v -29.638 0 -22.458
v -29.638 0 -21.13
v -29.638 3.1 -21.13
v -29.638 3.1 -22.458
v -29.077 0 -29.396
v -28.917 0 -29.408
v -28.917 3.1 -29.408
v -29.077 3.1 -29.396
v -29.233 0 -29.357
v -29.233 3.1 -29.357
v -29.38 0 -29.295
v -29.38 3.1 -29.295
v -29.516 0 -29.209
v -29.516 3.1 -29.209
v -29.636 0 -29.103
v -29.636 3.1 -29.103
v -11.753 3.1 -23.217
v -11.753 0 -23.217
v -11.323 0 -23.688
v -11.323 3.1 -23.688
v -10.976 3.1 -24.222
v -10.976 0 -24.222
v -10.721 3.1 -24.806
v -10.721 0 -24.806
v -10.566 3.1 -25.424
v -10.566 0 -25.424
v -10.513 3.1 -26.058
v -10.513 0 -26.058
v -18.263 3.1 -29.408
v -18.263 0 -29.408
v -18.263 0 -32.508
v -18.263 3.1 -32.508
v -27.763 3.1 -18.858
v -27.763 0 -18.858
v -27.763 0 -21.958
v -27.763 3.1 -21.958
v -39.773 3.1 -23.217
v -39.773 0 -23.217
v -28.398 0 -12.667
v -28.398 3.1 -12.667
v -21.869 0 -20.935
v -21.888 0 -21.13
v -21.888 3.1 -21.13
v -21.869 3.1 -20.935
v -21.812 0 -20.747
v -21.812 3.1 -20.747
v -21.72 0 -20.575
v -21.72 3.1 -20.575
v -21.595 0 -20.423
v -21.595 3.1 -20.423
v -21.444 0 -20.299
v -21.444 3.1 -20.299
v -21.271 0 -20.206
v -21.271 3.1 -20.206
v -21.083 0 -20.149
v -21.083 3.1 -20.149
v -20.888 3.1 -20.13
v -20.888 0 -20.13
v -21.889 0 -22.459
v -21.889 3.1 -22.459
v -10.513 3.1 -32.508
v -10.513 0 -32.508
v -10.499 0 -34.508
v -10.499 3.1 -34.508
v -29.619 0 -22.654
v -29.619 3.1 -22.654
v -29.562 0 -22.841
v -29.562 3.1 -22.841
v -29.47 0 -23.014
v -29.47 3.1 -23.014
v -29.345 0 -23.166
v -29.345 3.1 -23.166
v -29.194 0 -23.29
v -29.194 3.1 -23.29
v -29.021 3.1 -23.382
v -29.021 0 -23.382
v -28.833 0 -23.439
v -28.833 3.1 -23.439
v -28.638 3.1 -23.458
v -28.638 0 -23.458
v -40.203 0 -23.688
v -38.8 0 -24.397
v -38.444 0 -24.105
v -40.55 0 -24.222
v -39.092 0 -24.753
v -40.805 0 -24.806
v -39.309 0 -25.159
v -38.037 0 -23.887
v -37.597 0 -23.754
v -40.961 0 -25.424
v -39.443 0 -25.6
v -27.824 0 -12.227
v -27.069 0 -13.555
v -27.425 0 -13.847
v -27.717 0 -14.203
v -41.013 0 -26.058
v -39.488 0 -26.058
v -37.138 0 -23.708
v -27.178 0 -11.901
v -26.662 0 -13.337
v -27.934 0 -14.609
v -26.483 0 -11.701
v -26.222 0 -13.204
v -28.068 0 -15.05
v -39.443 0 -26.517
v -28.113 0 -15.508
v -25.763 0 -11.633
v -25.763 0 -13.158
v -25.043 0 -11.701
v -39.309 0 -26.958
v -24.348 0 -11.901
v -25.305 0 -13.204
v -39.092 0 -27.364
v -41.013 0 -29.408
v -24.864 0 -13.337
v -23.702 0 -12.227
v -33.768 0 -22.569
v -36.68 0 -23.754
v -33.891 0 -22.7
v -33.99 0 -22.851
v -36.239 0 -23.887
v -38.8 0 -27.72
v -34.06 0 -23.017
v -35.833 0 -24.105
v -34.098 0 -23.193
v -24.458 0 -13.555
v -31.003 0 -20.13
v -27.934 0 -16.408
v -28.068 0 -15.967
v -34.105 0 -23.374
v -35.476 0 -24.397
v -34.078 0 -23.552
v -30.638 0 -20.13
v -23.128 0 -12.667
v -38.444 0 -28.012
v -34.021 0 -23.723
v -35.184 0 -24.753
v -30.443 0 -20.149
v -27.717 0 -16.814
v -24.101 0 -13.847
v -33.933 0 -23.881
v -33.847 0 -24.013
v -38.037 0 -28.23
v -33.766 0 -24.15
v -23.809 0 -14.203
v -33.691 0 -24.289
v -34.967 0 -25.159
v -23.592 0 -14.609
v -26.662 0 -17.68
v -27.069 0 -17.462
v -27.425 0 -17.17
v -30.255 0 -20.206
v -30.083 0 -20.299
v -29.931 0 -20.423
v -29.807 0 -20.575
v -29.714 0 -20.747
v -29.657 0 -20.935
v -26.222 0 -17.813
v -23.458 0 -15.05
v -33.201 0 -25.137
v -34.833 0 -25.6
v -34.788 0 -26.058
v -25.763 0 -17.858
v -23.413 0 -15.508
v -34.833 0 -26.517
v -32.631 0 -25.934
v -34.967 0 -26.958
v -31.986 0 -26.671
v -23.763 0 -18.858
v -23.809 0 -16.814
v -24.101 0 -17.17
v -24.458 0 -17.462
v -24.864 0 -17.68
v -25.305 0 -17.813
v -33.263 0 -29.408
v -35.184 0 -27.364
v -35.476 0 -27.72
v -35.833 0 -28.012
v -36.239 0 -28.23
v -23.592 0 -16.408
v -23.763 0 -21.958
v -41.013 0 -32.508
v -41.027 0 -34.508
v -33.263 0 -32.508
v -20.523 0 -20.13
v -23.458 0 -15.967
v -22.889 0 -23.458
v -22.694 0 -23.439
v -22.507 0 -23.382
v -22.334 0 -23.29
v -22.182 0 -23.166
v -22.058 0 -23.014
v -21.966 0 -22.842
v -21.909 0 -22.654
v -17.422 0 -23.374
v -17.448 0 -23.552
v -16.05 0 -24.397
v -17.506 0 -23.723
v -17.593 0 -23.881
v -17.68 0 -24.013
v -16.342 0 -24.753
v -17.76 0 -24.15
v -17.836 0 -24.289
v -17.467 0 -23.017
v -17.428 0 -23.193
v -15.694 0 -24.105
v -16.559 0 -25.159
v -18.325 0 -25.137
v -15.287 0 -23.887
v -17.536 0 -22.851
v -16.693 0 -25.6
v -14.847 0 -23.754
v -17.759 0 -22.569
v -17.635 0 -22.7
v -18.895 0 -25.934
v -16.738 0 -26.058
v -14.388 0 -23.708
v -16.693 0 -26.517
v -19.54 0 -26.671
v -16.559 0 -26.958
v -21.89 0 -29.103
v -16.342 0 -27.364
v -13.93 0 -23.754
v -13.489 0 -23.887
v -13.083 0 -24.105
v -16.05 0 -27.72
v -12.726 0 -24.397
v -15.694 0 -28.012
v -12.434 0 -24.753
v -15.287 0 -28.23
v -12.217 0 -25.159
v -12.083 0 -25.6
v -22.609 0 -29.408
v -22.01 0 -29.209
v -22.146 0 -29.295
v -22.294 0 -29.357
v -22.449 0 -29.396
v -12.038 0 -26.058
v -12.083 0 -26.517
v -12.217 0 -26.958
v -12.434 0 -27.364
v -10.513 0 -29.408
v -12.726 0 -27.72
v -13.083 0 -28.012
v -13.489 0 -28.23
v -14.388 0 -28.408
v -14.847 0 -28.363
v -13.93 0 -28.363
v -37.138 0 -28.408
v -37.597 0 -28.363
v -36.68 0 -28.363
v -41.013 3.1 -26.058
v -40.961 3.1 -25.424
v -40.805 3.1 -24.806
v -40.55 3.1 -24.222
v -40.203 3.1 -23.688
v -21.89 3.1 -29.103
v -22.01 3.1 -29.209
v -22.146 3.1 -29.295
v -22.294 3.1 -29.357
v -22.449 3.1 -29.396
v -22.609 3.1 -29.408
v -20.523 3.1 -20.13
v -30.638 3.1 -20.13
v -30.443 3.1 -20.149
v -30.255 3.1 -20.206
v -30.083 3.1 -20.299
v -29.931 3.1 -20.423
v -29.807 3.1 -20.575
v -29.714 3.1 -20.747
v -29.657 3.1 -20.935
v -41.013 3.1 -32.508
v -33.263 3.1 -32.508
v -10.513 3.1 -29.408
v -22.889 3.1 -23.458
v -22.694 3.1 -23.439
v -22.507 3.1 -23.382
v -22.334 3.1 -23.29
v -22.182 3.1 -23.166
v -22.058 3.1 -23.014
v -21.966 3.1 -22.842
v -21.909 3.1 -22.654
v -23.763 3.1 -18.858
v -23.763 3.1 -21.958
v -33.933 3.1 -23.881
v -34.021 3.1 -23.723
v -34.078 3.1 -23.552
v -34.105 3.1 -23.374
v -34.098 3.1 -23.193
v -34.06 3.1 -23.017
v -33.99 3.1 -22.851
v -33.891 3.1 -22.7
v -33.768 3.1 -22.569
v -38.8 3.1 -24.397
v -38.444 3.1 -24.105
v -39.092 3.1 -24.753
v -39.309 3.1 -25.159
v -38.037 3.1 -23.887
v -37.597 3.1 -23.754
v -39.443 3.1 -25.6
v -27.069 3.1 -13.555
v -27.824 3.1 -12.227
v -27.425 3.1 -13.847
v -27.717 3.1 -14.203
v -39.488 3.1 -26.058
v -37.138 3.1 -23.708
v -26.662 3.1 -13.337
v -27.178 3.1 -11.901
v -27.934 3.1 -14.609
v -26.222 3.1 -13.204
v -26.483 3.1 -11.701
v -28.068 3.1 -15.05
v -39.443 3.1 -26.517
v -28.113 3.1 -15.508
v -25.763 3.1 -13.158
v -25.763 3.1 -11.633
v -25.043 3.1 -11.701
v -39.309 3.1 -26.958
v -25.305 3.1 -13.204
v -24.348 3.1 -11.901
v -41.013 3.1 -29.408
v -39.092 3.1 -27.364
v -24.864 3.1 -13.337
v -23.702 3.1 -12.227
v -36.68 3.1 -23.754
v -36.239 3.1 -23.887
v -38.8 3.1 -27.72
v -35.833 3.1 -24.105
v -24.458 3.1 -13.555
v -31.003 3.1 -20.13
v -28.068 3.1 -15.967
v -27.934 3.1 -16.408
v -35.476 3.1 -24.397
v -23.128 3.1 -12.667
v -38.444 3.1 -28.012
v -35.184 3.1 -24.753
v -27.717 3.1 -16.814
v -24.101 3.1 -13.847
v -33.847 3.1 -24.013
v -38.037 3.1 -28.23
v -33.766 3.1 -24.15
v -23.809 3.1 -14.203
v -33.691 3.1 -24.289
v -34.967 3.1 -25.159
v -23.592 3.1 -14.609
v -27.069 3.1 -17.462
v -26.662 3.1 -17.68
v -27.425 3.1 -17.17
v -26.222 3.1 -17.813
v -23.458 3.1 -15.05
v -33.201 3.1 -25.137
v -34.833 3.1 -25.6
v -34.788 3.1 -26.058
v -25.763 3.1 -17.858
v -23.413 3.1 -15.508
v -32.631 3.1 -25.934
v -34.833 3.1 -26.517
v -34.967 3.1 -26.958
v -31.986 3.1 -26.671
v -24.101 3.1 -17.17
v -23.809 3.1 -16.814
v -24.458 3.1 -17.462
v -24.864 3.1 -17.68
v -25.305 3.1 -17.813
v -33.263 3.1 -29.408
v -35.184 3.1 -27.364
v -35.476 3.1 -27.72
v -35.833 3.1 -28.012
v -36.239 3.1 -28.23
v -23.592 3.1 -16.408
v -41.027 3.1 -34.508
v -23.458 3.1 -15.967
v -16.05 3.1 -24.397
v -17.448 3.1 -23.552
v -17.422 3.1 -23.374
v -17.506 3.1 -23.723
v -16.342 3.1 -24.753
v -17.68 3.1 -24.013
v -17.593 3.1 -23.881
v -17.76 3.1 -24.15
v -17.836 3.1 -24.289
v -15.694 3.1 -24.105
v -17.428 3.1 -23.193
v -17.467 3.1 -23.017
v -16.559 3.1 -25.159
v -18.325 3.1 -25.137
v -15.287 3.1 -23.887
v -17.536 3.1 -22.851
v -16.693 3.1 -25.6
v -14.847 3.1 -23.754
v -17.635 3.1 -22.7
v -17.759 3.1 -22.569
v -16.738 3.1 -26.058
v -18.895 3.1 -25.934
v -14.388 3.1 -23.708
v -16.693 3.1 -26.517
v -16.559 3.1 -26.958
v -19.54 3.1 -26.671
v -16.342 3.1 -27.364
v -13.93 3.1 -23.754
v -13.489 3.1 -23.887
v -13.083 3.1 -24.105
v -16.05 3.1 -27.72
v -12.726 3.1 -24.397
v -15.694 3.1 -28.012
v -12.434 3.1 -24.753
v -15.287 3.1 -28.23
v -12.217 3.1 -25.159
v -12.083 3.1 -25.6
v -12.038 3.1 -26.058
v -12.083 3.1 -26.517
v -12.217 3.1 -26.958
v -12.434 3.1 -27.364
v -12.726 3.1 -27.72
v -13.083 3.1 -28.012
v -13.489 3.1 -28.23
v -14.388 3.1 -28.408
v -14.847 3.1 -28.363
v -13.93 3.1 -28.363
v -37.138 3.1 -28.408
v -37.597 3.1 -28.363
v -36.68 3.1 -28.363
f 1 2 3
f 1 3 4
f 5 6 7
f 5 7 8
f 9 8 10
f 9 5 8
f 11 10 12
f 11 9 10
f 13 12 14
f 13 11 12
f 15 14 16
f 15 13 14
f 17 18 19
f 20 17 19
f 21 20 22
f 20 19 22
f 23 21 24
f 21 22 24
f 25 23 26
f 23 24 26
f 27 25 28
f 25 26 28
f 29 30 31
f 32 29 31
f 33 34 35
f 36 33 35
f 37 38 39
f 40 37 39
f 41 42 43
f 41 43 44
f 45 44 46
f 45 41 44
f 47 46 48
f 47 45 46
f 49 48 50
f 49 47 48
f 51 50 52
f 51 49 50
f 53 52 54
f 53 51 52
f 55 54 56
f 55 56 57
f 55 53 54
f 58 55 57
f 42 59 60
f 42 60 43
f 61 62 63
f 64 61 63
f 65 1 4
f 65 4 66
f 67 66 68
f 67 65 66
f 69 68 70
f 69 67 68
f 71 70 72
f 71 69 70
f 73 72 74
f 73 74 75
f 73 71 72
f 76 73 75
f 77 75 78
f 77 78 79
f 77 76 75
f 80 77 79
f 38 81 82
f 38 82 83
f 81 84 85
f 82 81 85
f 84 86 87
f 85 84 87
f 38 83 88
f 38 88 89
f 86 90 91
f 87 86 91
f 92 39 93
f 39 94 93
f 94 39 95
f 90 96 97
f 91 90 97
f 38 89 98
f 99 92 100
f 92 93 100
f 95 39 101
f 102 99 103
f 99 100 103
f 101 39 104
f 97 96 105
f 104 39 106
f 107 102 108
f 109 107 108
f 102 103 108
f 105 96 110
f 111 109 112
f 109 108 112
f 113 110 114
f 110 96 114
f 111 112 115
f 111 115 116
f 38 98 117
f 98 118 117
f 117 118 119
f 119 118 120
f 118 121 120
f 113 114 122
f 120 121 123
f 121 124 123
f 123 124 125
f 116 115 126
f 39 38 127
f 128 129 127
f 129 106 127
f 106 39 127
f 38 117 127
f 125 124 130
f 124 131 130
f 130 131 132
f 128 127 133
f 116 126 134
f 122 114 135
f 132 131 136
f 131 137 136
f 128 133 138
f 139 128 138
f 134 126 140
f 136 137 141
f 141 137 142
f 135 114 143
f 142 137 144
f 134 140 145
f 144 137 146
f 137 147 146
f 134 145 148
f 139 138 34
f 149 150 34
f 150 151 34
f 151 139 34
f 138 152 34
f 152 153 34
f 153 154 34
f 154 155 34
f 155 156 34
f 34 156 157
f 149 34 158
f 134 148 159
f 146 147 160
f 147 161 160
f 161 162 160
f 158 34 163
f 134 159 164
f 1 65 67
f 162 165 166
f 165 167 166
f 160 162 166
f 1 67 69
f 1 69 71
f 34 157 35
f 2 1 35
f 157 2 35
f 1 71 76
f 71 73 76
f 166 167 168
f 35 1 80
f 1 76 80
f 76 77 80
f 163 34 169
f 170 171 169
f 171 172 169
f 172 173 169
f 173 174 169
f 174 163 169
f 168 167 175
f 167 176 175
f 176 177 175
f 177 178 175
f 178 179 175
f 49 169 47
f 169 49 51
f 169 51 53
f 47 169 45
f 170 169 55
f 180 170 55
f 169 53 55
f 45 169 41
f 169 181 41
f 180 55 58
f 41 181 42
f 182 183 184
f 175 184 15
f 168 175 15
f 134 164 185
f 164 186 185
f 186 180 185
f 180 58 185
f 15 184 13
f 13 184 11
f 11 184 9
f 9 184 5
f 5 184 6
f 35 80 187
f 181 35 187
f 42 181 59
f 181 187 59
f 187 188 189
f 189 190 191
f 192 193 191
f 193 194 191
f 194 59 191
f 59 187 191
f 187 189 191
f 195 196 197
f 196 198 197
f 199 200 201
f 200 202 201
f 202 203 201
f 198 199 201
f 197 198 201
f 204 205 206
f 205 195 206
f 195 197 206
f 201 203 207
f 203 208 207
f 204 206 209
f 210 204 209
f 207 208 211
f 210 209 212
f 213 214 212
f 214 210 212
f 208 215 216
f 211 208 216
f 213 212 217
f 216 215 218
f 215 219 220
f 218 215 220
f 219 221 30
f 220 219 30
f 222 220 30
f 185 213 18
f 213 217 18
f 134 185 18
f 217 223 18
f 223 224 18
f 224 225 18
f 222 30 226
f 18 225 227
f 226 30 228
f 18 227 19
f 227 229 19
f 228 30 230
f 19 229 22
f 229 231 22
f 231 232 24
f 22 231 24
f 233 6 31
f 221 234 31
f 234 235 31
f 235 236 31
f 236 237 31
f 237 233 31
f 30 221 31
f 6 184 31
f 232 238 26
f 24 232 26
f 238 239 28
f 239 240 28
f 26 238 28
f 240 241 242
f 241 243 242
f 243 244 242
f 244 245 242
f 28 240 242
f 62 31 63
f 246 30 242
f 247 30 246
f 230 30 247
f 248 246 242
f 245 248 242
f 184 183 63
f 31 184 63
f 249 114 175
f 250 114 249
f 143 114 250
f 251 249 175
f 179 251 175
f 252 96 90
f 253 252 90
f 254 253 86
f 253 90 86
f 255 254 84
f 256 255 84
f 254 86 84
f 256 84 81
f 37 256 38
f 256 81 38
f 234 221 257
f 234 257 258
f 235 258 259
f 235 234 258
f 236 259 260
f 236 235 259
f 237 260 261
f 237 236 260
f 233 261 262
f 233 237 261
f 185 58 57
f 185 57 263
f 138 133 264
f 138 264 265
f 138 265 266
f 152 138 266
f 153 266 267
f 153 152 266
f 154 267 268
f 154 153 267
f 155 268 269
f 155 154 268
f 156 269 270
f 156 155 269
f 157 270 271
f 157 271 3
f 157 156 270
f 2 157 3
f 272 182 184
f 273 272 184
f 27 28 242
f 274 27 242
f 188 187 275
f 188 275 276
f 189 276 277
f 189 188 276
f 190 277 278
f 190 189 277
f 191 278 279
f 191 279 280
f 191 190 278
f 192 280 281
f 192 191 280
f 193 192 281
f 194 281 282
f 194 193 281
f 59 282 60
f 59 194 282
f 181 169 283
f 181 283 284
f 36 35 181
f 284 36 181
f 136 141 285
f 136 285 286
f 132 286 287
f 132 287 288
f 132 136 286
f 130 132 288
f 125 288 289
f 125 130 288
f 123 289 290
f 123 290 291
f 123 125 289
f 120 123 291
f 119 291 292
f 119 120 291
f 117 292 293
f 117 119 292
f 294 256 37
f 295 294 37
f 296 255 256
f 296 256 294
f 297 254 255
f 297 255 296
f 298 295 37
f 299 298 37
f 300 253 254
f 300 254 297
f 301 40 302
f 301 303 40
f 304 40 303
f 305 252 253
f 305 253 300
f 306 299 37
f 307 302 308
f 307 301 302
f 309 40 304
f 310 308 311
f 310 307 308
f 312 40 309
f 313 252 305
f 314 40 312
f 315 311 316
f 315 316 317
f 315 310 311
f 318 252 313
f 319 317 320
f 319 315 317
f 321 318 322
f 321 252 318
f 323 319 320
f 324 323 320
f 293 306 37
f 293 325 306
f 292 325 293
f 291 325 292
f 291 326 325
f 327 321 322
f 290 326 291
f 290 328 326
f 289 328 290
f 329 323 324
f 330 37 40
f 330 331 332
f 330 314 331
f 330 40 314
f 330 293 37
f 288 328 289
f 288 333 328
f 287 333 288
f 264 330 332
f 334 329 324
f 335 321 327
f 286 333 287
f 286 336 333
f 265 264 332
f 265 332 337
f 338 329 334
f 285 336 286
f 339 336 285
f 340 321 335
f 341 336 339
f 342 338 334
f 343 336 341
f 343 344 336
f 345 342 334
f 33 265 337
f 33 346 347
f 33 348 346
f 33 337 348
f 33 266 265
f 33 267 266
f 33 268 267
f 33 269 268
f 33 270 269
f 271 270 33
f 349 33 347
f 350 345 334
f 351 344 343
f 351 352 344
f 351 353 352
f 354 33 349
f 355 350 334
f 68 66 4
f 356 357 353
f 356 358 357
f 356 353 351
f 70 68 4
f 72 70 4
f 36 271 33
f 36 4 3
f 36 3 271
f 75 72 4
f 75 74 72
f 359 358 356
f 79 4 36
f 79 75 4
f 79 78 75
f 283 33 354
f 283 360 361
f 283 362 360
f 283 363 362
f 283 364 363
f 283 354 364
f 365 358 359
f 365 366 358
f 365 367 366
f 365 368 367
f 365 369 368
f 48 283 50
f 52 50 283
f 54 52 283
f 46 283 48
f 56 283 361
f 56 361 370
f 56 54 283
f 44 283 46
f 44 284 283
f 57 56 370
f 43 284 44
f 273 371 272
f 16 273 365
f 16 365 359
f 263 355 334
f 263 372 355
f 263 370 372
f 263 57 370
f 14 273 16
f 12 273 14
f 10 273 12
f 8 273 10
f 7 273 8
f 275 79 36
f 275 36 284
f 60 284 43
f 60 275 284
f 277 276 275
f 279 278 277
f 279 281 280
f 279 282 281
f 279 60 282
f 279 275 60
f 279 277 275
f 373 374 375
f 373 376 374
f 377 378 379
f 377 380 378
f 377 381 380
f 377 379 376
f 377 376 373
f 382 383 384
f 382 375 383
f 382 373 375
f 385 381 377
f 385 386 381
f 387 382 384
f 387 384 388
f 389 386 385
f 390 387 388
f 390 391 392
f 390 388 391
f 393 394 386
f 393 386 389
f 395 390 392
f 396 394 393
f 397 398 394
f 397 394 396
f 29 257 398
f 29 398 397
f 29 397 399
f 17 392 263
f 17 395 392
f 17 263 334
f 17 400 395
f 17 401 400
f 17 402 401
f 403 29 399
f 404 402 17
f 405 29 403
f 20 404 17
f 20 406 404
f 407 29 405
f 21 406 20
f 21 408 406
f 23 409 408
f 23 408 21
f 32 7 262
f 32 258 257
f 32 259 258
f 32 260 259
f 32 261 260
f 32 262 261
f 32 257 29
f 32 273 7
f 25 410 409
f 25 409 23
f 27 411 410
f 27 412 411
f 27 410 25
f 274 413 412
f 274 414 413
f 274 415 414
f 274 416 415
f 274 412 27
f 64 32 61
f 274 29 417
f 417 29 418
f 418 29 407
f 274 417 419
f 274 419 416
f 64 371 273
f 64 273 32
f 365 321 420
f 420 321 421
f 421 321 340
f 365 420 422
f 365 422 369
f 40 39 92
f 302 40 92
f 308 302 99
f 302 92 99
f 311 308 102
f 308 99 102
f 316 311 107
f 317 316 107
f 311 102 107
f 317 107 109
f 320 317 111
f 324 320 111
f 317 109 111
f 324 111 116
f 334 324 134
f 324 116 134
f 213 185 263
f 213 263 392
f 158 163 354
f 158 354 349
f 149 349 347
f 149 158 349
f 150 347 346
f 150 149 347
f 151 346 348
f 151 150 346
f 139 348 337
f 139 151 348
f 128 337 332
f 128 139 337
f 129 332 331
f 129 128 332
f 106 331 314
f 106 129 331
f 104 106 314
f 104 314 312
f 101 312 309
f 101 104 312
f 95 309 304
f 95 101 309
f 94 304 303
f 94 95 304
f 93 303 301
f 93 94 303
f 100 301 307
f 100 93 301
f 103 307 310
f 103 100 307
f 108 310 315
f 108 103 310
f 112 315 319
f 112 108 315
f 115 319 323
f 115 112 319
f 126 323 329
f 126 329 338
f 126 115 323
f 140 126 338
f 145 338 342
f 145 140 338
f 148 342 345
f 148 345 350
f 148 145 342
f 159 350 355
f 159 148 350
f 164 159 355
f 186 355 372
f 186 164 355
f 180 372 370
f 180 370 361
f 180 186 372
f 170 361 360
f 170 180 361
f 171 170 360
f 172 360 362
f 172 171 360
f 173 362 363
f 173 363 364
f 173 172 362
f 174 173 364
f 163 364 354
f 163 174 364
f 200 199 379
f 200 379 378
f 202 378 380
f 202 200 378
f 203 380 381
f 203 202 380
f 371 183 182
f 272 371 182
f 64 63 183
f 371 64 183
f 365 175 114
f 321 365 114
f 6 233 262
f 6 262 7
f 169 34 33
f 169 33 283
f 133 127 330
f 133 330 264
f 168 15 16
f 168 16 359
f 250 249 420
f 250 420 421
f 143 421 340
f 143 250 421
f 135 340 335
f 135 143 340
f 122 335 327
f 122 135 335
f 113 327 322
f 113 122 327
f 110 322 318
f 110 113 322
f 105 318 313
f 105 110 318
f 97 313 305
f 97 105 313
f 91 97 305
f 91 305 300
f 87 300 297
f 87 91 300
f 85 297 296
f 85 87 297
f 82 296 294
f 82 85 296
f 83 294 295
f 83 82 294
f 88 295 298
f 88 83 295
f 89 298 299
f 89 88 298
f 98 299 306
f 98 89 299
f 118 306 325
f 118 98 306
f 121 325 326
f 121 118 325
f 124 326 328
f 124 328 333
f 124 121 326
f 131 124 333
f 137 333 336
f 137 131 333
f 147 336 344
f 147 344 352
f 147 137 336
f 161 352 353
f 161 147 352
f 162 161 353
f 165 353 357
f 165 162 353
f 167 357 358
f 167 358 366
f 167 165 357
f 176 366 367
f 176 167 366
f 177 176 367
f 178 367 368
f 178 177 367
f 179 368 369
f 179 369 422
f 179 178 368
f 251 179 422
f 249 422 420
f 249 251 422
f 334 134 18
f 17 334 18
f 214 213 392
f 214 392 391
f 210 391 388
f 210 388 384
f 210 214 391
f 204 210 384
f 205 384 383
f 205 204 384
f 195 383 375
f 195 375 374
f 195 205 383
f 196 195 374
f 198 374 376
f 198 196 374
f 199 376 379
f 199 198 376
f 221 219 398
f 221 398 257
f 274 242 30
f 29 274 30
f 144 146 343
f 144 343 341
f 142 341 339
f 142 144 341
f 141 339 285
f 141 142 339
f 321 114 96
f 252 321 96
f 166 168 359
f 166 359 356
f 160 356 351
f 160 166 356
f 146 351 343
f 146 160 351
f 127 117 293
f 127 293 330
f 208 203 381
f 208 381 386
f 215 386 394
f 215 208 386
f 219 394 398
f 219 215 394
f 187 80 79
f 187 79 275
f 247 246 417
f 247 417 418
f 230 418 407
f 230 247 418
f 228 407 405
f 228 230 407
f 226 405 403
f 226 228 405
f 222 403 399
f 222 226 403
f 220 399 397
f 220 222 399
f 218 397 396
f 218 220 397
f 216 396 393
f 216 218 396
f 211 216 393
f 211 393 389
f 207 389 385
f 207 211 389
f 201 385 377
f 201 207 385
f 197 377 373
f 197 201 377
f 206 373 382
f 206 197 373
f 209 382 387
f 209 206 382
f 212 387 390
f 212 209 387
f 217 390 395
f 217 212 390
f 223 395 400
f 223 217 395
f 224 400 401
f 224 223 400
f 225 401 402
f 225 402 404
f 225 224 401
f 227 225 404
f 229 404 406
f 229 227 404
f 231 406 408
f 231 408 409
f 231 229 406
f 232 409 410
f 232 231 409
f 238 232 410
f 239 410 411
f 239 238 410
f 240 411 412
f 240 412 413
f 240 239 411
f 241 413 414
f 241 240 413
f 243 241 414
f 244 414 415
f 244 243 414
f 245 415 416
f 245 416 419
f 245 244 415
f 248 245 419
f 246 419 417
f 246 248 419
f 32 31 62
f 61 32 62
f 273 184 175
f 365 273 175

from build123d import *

# Parameters (mm, degrees)
SKETCH1_R      = 2.35
SKETCH1_W      = 4
SKETCH1_H      = 3.1
EXTRUDE1_DEPTH = 3.1


with BuildPart() as part:
    # Sketch1 → Extrude1 (new body)
    with BuildSketch(Plane(origin=(0, 0, 0), x_dir=(1, 0, 0), z_dir=(0, 1, 0))):
        with BuildLine():
            Line((-41.013157114, 29.408489293), (-41.013157114, 26.058489293))
            ThreePointArc((-41.013157114, 26.058489293), (-40.689672648, 24.508533678), (-39.773228128, 23.217358224))
            Line((-39.773228128, 23.217358224), (-28.398228128, 12.667358224))
            ThreePointArc((-28.398228128, 12.667358224), (-25.763157114, 11.633489293), (-23.1280861, 12.667358224))
            Line((-23.1280861, 12.667358224), (-11.7530861, 23.217358224))
            ThreePointArc((-11.7530861, 23.217358224), (-10.83664158, 24.508533678), (-10.513157114, 26.058489293))
            Line((-10.513157114, 26.058489293), (-10.513157114, 29.408489293))
            Line((-10.513157114, 29.408489293), (-18.263157114, 29.408489293))
            Line((-18.263157114, 29.408489293), (-18.263157114, 32.508489293))
            Line((-18.263157114, 32.508489293), (-10.513157114, 32.508489293))
            Line((-10.513157114, 32.508489293), (-10.498924525, 34.508489293))
            Line((-10.498924525, 34.508489293), (-41.027382287, 34.508489293))
            Line((-41.027382287, 34.508489293), (-41.013157114, 32.508489293))
            Line((-41.013157114, 32.508489293), (-33.263157114, 32.508489293))
            Line((-33.263157114, 32.508489293), (-33.263157114, 29.408489293))
            Line((-33.263157114, 29.408489293), (-41.013157114, 29.408489293))
        make_face()
        with Locations(Location((-14.388157114, 26.058489293, 0), (0, 0, 90))):
            Circle(SKETCH1_R, mode=Mode.SUBTRACT)
        with Locations(Location((-37.138157114, 26.058489293, 0), (0, 0, 90))):
            Circle(SKETCH1_R, mode=Mode.SUBTRACT)
        with Locations(Location((-25.763157114, 15.508489293, 0), (0, 0, 90))):
            Circle(SKETCH1_R, mode=Mode.SUBTRACT)
        with BuildLine():
            Line((-33.76750302, 22.568552775), (-31.002944054, 20.130132194))
            Line((-31.002944054, 20.130132194), (-30.638157114, 20.130132194))
            ThreePointArc((-30.638157114, 20.130132194), (-29.931050333, 20.423025412), (-29.638157114, 21.130132194))
            Line((-29.638157114, 21.130132194), (-29.638157114, 22.458489293))
            ThreePointArc((-29.638157114, 22.458489293), (-29.345263895, 23.165596075), (-28.638157114, 23.458489293))
            Line((-28.638157114, 23.458489293), (-22.889213944, 23.458489293))
            ThreePointArc((-22.889213944, 23.458489293), (-22.182388419, 23.165877219), (-21.889214261, 22.459284647))
            Line((-21.889214261, 22.459284647), (-21.888157114, 21.130132194))
            ThreePointArc((-21.888157114, 21.130132194), (-21.595263895, 20.423025412), (-20.888157114, 20.130132194))
            Line((-20.888157114, 20.130132194), (-20.523370174, 20.130132194))
            Line((-20.523370174, 20.130132194), (-17.758811208, 22.568552775))
            ThreePointArc((-17.758811208, 22.568552775), (-17.428169762, 23.19327051), (-17.593190704, 23.880558008))
            ThreePointArc((-17.593190704, 23.880558008), (-17.720651816, 24.081090988), (-17.835582513, 24.289059126))
            ThreePointArc((-17.835582513, 24.289059126), (-18.600140603, 25.542598068), (-19.540017718, 26.670667198))
            Line((-19.540017718, 26.670667198), (-21.890008982, 29.103277241))
            ThreePointArc((-21.890008982, 29.103277241), (-22.218575416, 29.329029338), (-22.609223629, 29.408489293))
            Line((-22.609223629, 29.408489293), (-28.917090599, 29.408489293))
            ThreePointArc((-28.917090599, 29.408489293), (-29.307738812, 29.329029338), (-29.636305246, 29.103277241))
            Line((-29.636305246, 29.103277241), (-31.98629651, 26.670667198))
            ThreePointArc((-31.98629651, 26.670667198), (-32.926173625, 25.542598068), (-33.690731715, 24.289059126))
            ThreePointArc((-33.690731715, 24.289059126), (-33.805662411, 24.081090988), (-33.933123524, 23.880558008))
            ThreePointArc((-33.933123524, 23.880558008), (-34.098144466, 23.19327051), (-33.76750302, 22.568552775))
        make_face(mode=Mode.SUBTRACT)
        with Locations((-25.763157114, 20.408489293)):
            Rectangle(SKETCH1_W, SKETCH1_H, mode=Mode.SUBTRACT)
    extrude(amount=EXTRUDE1_DEPTH)


solid = part.part
